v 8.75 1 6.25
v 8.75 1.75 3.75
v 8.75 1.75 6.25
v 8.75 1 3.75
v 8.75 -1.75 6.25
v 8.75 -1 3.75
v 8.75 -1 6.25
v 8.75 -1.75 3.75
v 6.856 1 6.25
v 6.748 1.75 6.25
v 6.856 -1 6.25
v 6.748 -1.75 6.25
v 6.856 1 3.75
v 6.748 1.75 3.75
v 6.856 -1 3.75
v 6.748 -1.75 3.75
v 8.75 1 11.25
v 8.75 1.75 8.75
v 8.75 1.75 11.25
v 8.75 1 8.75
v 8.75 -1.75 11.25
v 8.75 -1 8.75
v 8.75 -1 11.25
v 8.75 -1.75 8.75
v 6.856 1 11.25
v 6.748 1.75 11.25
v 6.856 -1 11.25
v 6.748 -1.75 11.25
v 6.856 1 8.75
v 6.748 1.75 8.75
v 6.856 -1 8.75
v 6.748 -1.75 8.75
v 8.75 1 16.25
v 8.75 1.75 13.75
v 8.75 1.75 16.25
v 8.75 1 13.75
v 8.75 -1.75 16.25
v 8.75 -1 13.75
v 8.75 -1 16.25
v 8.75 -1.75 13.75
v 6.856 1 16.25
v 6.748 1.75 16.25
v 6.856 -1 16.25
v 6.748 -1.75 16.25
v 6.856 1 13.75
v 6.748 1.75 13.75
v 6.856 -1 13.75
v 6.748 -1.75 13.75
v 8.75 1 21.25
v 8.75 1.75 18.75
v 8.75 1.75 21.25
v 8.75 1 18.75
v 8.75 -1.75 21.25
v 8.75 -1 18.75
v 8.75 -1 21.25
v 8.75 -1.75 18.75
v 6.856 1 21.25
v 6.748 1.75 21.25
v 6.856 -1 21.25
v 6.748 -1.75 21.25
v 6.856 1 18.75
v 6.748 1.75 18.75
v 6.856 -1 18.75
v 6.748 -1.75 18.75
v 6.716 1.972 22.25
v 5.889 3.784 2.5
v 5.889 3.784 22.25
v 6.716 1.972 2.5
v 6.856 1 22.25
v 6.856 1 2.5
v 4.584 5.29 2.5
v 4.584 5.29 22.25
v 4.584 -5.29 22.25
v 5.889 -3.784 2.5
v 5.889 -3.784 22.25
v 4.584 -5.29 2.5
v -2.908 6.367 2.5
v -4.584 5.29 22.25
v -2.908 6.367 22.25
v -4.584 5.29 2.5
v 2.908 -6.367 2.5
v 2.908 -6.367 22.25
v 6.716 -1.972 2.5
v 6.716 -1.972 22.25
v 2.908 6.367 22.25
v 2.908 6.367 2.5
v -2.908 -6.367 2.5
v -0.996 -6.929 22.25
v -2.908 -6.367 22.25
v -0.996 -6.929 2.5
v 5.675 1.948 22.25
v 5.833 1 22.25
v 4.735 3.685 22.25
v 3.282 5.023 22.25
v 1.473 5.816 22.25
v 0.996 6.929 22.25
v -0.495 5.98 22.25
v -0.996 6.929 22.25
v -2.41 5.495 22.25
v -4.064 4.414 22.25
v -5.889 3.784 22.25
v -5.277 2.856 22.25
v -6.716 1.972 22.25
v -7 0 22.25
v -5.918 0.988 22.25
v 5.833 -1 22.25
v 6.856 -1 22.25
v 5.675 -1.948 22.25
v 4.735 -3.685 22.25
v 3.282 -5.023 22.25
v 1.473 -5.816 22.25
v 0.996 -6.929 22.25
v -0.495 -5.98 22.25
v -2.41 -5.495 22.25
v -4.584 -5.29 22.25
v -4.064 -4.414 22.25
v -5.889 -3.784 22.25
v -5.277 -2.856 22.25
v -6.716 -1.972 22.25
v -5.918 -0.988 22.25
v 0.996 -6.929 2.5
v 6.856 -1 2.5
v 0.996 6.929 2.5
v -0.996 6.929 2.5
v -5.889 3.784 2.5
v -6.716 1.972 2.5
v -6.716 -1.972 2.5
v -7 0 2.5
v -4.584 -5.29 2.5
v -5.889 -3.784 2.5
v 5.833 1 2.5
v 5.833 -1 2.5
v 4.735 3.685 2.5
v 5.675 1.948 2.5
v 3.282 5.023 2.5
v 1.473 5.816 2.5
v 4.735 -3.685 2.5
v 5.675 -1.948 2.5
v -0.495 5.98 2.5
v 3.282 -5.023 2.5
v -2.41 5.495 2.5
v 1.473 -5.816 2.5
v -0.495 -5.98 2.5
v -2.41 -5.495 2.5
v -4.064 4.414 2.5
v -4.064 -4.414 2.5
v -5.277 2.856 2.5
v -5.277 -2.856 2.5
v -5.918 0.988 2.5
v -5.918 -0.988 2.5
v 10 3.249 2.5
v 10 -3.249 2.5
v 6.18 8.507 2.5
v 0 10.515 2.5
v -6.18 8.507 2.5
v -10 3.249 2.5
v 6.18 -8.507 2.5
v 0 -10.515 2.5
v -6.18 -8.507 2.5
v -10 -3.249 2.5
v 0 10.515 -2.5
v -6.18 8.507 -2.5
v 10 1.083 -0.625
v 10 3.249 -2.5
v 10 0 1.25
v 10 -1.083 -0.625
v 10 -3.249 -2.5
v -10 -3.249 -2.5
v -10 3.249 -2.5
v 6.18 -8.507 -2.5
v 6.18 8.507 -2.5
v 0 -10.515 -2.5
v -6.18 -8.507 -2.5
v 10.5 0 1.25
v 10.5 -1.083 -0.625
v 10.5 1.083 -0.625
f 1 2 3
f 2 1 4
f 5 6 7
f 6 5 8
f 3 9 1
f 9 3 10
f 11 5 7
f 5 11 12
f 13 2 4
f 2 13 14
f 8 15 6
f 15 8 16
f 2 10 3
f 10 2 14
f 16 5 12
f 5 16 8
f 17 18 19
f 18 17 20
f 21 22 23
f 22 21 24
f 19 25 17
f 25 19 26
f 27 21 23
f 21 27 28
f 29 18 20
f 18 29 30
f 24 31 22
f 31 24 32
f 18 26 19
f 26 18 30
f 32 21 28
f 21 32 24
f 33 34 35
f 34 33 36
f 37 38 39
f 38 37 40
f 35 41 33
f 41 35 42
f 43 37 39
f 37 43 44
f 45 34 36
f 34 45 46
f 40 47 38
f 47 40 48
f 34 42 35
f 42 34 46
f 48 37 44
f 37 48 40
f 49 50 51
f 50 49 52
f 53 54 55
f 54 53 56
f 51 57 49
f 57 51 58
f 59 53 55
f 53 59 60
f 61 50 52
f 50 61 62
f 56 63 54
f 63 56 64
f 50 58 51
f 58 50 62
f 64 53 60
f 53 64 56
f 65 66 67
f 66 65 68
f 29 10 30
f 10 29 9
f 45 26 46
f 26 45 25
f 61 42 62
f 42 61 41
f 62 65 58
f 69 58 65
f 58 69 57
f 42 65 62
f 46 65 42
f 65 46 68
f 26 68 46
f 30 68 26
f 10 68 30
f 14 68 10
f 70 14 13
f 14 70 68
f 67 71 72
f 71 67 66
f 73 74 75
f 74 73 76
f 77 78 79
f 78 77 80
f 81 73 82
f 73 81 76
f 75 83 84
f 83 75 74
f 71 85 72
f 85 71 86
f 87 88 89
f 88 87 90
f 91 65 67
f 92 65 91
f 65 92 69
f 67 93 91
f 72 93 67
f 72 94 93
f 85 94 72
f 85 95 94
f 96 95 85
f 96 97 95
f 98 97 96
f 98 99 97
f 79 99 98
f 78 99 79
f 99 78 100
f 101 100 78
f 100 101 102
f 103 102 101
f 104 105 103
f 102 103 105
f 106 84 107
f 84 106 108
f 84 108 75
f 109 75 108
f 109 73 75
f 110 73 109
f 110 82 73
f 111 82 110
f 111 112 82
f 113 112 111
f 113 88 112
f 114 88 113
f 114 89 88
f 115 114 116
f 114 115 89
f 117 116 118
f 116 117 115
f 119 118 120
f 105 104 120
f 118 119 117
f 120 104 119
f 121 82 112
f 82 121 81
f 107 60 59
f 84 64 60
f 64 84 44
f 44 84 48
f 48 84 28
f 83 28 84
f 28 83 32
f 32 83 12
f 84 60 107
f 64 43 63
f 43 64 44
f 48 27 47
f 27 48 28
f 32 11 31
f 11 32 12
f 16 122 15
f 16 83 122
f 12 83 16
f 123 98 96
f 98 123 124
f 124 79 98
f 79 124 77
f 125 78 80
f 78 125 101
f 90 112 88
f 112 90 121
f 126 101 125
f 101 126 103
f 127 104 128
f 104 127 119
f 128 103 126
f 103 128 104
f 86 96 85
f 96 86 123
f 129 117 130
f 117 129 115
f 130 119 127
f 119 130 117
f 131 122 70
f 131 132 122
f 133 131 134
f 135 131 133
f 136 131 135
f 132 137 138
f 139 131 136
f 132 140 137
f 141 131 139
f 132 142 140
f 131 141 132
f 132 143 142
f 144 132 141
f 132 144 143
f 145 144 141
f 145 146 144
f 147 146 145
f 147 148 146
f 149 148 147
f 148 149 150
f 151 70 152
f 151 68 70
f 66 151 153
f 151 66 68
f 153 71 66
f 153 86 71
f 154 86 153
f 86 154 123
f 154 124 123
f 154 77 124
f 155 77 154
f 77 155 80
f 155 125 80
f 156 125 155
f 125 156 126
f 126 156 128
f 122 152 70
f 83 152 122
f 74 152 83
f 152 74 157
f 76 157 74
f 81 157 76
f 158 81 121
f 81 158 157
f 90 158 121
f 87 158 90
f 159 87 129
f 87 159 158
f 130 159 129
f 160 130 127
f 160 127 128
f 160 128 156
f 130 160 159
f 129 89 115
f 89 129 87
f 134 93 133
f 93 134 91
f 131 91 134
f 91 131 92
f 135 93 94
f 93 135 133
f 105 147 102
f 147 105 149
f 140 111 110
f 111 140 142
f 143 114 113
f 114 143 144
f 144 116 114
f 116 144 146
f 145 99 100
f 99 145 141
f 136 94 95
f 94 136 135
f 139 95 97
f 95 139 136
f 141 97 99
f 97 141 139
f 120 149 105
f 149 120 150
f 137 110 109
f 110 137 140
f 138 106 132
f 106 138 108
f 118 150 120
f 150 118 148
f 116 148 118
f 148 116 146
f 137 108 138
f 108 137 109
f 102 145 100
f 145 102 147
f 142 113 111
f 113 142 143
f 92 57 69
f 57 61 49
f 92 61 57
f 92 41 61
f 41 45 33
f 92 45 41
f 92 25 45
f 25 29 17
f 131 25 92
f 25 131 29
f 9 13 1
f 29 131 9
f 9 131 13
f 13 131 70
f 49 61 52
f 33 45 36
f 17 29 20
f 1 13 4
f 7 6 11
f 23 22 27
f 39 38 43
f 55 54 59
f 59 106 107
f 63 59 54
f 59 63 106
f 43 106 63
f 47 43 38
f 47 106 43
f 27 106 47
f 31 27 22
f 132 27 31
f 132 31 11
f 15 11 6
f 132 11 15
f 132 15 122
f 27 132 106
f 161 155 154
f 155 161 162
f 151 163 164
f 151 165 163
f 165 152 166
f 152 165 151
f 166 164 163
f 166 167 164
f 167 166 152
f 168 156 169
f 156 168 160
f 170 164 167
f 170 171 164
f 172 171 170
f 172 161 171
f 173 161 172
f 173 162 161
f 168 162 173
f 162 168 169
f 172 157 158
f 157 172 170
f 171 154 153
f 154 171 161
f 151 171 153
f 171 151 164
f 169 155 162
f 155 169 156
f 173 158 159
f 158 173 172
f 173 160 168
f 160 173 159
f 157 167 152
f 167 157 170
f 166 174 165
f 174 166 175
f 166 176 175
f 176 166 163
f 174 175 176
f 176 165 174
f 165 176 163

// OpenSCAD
// file: sharedgeometry.scad
// Cryptex Shared Geometries


// polygonal-based prism defition
module ngonPrism(n, r, h) {
    linear_extrude(height = h, center=true) 
        polygon([
            for (i=[0:n-1], a=(i+1/2)*360/n) 
                [ r*cos(a)/cos(180/n), r*sin(a)/cos(180/n) ]
        ]);
}
// main file
// Cryptex Spindle Model


// Shared geometries
// for polygonal-based prism defition
use <sharedgeometry.scad>


module cryptexSpindle(n, digits, outer_radius, inner_radius, width, thickness, clearance){
    // Base
    ngonPrism(n, outer_radius, width);
    // Alignment Indicator
    translate([outer_radius,0,0])
        rotate([90,90,90]) 
            ngonPrism(3, width/8, thickness);
    // Shaft
    translate([0,0,(digits+1)*width/2]){
        difference(){
            union(){
                // Body
                translate([0,0,-clearance/2]) cylinder(h=digits*width-clearance, r=inner_radius, center=true);
                // Nodes
                for (i=[0:digits-1], h=(i+1/2-digits/2)*width) 
                    translate([inner_radius,0,h]) 
                        cube([2*(outer_radius-inner_radius-thickness-clearance), 4*thickness-2*clearance, width-2*(thickness+clearance)], center=true);
            };
            union(){
                // Hollow center
                cylinder(h=digits*width, r=inner_radius-thickness, center=true);
                // Node Space
                translate([inner_radius,0,0]) 
                    cube([2*(outer_radius-inner_radius-thickness), 2*thickness, digits*width], center=true);
            }
        };
    }
}




// Main Model
n = 10;
digits = 4;

inner_radius = 7;
outer_radius = 10;
width = 5;
thickness = 1;

clearance = 0.25;

face = 2*tan(180/n)*outer_radius;
echo(face);

cryptexSpindle(n, digits, outer_radius, inner_radius, width, thickness, clearance);
